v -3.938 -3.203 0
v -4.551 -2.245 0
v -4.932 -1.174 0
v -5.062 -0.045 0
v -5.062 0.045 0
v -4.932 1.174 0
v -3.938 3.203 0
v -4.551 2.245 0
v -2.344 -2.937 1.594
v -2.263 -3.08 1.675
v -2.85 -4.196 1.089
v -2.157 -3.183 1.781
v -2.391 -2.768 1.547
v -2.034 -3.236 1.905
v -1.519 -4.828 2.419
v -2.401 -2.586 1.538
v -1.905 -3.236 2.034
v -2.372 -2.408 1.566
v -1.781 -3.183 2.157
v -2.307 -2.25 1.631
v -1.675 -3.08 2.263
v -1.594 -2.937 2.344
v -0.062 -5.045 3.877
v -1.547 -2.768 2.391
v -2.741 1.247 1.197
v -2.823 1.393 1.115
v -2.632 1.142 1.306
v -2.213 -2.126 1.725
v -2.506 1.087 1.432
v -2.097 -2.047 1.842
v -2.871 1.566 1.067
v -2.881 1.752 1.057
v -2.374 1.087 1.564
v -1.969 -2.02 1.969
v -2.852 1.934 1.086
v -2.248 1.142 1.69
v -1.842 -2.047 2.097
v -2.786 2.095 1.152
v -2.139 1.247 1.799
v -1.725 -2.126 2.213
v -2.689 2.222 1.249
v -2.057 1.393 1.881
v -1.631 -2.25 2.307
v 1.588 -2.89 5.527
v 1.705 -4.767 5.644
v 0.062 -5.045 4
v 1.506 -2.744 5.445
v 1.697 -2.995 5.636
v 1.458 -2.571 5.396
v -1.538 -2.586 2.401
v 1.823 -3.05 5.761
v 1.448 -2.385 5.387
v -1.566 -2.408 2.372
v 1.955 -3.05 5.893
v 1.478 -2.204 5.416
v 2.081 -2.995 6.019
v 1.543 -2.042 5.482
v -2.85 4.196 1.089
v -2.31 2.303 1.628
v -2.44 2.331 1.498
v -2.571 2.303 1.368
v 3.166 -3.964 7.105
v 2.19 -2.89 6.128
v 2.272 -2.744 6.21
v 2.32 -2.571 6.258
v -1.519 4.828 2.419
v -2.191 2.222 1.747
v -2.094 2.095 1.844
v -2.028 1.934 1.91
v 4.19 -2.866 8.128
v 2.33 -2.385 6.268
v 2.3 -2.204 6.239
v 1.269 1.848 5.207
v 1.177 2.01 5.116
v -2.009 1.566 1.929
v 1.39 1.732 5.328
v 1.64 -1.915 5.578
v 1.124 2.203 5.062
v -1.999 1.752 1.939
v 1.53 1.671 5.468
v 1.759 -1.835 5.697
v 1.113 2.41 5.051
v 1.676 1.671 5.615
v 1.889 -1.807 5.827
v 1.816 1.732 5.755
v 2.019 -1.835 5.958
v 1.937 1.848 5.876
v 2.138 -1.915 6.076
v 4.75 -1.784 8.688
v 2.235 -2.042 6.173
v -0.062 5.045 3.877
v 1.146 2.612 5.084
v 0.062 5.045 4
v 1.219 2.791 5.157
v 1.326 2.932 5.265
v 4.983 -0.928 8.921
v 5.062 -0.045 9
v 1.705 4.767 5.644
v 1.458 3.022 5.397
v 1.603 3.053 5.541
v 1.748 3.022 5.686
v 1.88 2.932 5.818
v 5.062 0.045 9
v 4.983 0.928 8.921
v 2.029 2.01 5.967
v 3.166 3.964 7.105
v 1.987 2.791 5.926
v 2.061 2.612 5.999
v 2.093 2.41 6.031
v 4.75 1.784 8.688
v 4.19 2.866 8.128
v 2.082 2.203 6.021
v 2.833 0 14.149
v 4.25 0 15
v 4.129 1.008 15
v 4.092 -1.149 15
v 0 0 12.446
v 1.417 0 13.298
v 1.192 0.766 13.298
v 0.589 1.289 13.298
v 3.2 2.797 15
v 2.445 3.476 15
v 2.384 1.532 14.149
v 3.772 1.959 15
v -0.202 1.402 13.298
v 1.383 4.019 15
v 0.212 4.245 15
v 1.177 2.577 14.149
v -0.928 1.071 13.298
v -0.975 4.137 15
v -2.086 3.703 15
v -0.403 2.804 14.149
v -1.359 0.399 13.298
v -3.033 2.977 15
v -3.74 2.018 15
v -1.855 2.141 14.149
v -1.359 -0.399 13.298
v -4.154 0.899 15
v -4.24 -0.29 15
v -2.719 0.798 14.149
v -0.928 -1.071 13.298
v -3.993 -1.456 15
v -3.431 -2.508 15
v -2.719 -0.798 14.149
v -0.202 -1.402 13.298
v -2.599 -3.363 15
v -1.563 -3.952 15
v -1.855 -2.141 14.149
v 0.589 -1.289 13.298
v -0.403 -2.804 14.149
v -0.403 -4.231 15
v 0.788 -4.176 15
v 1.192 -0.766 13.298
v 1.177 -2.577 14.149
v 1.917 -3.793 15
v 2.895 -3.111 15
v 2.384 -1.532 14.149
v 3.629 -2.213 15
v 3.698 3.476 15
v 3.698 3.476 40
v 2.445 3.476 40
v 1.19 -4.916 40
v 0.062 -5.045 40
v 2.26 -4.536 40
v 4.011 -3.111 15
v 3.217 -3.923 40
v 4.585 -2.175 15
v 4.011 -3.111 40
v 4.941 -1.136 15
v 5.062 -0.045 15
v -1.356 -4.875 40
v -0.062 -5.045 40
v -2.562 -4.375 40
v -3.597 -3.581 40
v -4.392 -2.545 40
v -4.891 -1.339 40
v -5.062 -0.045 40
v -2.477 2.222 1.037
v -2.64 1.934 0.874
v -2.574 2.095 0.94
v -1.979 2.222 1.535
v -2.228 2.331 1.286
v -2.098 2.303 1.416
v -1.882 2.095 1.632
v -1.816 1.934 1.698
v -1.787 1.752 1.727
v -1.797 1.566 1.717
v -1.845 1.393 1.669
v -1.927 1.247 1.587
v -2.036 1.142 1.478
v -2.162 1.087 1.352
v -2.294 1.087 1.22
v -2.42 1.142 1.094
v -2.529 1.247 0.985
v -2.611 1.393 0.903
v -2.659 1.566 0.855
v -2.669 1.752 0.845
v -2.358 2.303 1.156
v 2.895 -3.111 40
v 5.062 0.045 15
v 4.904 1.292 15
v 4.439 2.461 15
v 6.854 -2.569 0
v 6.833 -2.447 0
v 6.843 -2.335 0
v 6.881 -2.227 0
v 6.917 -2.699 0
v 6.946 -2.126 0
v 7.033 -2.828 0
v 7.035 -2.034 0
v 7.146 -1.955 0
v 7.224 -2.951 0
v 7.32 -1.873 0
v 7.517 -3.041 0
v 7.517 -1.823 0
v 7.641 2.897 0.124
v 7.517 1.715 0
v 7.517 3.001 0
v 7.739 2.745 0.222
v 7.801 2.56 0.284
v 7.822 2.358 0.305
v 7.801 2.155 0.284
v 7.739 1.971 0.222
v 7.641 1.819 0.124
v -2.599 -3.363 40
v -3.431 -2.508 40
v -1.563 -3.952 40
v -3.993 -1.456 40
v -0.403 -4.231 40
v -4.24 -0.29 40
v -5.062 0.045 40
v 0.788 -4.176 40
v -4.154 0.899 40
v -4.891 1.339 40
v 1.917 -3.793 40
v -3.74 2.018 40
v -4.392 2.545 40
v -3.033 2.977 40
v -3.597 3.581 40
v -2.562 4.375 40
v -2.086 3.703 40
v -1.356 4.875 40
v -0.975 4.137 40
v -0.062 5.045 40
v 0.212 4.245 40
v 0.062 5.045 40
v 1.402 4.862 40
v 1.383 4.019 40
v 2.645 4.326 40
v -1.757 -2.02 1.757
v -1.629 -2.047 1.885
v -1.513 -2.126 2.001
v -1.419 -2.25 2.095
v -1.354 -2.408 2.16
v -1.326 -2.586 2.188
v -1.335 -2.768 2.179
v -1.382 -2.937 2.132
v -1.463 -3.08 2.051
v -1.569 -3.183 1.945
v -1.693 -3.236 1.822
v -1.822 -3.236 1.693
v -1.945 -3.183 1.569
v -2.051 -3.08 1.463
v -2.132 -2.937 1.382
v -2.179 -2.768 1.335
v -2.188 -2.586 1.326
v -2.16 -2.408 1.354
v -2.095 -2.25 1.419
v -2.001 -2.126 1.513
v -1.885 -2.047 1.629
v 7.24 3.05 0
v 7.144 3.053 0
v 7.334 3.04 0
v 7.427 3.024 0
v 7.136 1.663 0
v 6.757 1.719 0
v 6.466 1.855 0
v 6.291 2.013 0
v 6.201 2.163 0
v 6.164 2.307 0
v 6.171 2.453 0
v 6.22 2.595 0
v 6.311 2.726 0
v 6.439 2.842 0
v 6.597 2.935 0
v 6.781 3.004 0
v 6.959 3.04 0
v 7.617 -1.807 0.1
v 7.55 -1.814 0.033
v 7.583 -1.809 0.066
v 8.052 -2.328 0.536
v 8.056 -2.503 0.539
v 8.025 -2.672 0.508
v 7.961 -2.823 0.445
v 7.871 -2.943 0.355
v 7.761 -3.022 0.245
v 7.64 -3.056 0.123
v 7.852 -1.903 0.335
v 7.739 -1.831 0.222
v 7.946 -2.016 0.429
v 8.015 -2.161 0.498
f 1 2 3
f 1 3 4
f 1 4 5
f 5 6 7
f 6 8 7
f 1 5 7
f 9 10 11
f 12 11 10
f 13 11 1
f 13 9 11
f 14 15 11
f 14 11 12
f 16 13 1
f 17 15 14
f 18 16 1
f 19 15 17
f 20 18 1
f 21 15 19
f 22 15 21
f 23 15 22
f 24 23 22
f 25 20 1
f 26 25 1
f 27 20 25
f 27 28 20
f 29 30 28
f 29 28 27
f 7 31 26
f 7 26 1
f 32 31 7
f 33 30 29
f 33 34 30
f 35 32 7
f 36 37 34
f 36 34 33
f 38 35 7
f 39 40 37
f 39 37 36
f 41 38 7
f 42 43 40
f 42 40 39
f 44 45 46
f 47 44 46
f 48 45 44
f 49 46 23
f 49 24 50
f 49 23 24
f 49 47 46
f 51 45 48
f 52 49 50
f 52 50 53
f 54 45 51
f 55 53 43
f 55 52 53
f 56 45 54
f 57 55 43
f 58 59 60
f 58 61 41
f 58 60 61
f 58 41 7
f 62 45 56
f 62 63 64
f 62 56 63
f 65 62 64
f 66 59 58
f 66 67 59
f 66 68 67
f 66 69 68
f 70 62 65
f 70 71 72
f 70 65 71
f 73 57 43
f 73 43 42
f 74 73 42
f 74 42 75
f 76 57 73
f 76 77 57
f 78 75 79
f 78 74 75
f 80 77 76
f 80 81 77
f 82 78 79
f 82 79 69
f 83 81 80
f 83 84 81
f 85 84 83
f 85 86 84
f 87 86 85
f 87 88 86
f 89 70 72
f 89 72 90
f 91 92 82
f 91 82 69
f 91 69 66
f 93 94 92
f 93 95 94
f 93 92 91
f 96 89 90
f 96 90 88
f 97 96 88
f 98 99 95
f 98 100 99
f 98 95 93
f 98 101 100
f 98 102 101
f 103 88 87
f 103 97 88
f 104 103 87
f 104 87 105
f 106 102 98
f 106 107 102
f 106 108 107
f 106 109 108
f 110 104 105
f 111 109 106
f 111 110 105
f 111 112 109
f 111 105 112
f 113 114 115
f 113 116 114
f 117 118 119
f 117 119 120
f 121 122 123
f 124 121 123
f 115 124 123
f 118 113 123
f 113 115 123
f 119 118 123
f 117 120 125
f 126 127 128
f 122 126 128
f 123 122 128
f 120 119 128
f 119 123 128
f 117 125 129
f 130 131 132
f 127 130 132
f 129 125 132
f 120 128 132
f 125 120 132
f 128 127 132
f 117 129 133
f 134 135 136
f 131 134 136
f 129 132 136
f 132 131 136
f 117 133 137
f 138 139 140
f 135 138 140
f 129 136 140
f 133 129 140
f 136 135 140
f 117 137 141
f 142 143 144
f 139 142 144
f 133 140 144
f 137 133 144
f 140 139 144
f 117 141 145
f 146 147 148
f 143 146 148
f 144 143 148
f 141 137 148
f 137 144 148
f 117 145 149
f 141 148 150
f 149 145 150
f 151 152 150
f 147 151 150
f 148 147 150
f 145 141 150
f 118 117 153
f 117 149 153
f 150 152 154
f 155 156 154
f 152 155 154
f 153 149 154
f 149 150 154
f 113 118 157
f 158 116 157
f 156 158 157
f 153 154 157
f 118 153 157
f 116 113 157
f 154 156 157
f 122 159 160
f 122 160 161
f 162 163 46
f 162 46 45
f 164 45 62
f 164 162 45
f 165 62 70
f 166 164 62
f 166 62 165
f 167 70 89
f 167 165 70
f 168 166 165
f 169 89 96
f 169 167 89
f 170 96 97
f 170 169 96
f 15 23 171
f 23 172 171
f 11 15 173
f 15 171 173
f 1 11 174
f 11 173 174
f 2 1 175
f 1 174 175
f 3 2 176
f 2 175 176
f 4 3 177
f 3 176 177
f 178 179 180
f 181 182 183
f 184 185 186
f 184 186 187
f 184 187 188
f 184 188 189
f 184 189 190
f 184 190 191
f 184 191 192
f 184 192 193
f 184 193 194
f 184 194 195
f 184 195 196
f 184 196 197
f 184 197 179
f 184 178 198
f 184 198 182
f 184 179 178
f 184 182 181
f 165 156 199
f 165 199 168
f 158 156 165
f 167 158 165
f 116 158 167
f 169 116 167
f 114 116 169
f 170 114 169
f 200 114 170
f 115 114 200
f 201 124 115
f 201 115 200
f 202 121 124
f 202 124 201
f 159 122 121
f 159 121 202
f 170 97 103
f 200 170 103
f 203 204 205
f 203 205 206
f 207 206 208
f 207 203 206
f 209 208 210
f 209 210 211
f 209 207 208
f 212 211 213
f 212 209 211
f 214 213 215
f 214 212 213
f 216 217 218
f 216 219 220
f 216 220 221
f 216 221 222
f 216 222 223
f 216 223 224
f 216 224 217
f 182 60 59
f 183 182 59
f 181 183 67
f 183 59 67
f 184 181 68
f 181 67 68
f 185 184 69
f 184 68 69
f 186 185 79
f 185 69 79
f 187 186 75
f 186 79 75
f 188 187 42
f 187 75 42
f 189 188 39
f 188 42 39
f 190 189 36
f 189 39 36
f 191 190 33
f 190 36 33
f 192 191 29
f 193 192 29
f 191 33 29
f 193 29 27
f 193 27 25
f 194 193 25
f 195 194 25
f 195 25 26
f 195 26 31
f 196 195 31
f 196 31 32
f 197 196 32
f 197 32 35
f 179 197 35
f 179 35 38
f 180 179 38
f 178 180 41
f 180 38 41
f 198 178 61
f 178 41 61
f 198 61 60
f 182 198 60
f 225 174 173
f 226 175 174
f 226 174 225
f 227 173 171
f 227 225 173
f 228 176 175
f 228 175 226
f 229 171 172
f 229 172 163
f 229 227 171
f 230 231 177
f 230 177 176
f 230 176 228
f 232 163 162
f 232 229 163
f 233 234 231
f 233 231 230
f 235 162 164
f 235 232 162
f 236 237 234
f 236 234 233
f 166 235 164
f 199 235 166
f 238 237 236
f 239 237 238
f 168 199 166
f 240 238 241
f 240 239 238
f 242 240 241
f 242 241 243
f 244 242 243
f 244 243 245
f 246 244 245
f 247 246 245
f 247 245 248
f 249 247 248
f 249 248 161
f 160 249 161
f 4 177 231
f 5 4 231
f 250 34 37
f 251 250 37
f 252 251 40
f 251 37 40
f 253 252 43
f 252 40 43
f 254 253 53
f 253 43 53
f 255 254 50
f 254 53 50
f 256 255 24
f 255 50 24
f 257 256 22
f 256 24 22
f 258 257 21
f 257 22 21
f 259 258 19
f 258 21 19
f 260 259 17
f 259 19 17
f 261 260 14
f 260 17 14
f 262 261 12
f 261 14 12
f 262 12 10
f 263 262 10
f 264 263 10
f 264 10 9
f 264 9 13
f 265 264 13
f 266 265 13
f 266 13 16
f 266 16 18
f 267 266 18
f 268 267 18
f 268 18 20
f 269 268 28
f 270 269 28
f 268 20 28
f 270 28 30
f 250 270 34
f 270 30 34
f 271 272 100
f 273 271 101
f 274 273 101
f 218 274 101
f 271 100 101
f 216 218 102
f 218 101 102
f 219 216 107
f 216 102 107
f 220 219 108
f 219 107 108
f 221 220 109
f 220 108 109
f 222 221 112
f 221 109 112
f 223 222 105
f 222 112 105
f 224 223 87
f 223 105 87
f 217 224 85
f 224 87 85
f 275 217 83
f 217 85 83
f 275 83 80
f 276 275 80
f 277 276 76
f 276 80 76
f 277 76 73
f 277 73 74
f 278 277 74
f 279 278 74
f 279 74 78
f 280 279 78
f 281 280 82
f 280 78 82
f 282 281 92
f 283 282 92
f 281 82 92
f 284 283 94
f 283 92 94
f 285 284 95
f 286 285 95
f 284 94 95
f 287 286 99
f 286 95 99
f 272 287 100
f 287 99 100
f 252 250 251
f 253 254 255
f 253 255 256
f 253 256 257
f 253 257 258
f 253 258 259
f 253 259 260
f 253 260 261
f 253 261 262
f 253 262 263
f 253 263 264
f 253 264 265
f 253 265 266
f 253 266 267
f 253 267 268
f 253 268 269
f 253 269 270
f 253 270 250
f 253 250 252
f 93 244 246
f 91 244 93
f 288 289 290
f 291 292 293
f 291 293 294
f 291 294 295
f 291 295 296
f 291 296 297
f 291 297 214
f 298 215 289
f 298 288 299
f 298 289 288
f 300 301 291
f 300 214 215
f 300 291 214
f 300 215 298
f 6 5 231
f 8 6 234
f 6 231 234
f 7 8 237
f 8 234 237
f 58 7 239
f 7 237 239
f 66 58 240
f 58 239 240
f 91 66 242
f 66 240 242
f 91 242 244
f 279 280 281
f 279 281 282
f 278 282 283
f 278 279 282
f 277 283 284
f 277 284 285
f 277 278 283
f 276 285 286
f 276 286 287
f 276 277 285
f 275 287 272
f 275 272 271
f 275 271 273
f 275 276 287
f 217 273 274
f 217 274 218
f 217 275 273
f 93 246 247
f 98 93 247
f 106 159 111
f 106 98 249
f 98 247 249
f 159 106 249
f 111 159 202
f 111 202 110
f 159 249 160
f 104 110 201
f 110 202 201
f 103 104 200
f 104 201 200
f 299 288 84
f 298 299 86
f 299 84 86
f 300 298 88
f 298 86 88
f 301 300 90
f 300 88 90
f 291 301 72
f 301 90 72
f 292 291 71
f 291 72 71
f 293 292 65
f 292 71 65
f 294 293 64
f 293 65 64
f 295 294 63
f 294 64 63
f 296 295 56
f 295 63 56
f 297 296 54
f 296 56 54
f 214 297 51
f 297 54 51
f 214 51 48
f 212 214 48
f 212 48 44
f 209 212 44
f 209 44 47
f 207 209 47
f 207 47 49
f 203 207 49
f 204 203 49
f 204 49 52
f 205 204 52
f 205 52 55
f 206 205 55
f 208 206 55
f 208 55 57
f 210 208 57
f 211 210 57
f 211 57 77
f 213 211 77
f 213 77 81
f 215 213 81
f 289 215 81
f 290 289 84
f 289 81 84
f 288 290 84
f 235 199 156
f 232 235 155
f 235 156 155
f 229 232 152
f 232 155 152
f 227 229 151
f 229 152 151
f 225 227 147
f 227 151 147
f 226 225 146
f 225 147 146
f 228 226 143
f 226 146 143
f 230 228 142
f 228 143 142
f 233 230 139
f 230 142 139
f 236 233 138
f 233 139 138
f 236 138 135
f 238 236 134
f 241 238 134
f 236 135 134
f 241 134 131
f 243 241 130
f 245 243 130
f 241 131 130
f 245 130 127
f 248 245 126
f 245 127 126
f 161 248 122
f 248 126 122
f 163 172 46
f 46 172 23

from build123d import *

# Parameters (mm, degrees)
F0_W      = 10.1233841851
F0_H      = 10.0899571553
F1_DEPTH  = 40
F3_D      = 8.5
F3_DEPTH  = 25
F3_TIP    = 2.5536576309
F4_SIZE   = 9
F5_R      = 0.6119078038
F5_R_2    = 0.6255064778
F5_R_3    = 0.6950065758
F5_R_4    = 0.6250316631
F6_DEPTH  = 0.3
F8_DEPTH  = 25
F9_R      = 5
F10_DEPTH = 7.8
F11_W     = 25.9334780276
F11_H     = 20.5789422616
F12_DEPTH = 25


with BuildPart() as f1:
    # F0 (on Top) → F1 (new body)
    with BuildSketch(Plane.XY):
        Rectangle(F0_W, F0_H)
    extrude(amount=F1_DEPTH)

    # F3
    with Locations(Plane.XY.offset(40)):
        with Locations((0, 0)):
            Hole(F3_D / 2, depth=F3_DEPTH)
            with Locations((0, 0, -(F3_DEPTH + F3_TIP / 2))):  # 118° drill point
                Cone(0, F3_D / 2, F3_TIP, mode=Mode.SUBTRACT)

    # F4
    f4_edges = [f1.edges().sort_by_distance(p)[0] for p in [
        (5.061692, 0, 0),
    ]]
    chamfer(f4_edges, length=F4_SIZE)

    # F5 (on face) → F6 (join)
    with BuildSketch(Plane(origin=(-1.9691539537, 0, 1.9691539537), x_dir=(0, 1, 0), z_dir=(0.7071067812, 0, -0.7071067812))):
        with Locations((-2.6314246934, 0)):
            Circle(F5_R)
        with Locations((1.7054068157, -0.6661886582)):
            Circle(F5_R_2)
        with Locations((2.3579068948, 5.0519071519)):
            Circle(F5_R_3)
        with Locations((-2.431909088, 5.4562026635)):
            Circle(F5_R_4)
    extrude(amount=F6_DEPTH)

    # F7 (on face) → F8 (cut)
    with BuildSketch(Plane.XY.offset(40)):
        with BuildLine():
            Line((2.8953096145, -3.1112187702), (5.0616920926, -3.1112187702))
            Line((5.0616920926, -3.1112187702), (5.0616920926, 3.4764062685))
            Line((5.0616920926, 3.4764062685), (2.44481072, 3.4764062685))
            ThreePointArc((2.44481072, 3.4764062685), (3.7717996739, 1.9585778565), (4.25, 0))
            ThreePointArc((4.25, 0), (3.8966373876, -1.6966782456), (2.8953096145, -3.1112187702))
        make_face()
        with BuildLine():
            Line((2.44481072, -3.1112187702), (2.8953096145, -3.1112187702))
            ThreePointArc((2.8953096145, -3.1112187702), (3.8966373876, -1.6966782456), (4.25, 0))
            ThreePointArc((4.25, 0), (3.7717996739, 1.9585778565), (2.44481072, 3.4764062685))
            Line((2.44481072, 3.4764062685), (2.44481072, -3.1112187702))
        make_face()
    extrude(amount=-F8_DEPTH, mode=Mode.SUBTRACT)

    # F9
    f9_edges = [f1.edges().sort_by_distance(p)[0] for p in [
        (-5.061692, 5.044979, 20),
        (-5.061692, -5.044979, 20),
        (5.061692, -5.044979, 24.5),
        (5.061692, 5.044979, 24.5),
    ]]
    fillet(f9_edges, radius=F9_R)

    # F10 (add): faces of the model
    f10_faces = [f1.faces().sort_by_distance(p)[0] for p in [
        (1.8152158857, 2.3579068948, 5.3292597244),
        (2.1010959835, -2.431909088, 5.6151398222),
    ]]
    extrude(f10_faces, amount=F10_DEPTH)

    # F11 (on face) → F12 (cut)
    with BuildSketch(Plane(origin=(0, 0, 0), x_dir=(1, 0, 0), z_dir=(0, 0, -1))):
        with Locations((1.6984669492, -1.4439118095)):
            Rectangle(F11_W, F11_H)
        with BuildLine():
            Line((-3.9383079074, 3.2028021674), (-3.9383079074, -3.2028021674))
            ThreePointArc((-3.9383079074, -3.2028021674), (-4.7724817862, -1.7208247707), (-5.0616920926, -0.0449785776))
            Line((-5.0616920926, -0.0449785776), (-5.0616920926, 0.0449785776))
            ThreePointArc((-5.0616920926, 0.0449785776), (-4.7724817862, 1.7208247707), (-3.9383079074, 3.2028021674))
        make_face(mode=Mode.SUBTRACT)
    extrude(amount=F12_DEPTH, mode=Mode.SUBTRACT)


solid = f1.part
